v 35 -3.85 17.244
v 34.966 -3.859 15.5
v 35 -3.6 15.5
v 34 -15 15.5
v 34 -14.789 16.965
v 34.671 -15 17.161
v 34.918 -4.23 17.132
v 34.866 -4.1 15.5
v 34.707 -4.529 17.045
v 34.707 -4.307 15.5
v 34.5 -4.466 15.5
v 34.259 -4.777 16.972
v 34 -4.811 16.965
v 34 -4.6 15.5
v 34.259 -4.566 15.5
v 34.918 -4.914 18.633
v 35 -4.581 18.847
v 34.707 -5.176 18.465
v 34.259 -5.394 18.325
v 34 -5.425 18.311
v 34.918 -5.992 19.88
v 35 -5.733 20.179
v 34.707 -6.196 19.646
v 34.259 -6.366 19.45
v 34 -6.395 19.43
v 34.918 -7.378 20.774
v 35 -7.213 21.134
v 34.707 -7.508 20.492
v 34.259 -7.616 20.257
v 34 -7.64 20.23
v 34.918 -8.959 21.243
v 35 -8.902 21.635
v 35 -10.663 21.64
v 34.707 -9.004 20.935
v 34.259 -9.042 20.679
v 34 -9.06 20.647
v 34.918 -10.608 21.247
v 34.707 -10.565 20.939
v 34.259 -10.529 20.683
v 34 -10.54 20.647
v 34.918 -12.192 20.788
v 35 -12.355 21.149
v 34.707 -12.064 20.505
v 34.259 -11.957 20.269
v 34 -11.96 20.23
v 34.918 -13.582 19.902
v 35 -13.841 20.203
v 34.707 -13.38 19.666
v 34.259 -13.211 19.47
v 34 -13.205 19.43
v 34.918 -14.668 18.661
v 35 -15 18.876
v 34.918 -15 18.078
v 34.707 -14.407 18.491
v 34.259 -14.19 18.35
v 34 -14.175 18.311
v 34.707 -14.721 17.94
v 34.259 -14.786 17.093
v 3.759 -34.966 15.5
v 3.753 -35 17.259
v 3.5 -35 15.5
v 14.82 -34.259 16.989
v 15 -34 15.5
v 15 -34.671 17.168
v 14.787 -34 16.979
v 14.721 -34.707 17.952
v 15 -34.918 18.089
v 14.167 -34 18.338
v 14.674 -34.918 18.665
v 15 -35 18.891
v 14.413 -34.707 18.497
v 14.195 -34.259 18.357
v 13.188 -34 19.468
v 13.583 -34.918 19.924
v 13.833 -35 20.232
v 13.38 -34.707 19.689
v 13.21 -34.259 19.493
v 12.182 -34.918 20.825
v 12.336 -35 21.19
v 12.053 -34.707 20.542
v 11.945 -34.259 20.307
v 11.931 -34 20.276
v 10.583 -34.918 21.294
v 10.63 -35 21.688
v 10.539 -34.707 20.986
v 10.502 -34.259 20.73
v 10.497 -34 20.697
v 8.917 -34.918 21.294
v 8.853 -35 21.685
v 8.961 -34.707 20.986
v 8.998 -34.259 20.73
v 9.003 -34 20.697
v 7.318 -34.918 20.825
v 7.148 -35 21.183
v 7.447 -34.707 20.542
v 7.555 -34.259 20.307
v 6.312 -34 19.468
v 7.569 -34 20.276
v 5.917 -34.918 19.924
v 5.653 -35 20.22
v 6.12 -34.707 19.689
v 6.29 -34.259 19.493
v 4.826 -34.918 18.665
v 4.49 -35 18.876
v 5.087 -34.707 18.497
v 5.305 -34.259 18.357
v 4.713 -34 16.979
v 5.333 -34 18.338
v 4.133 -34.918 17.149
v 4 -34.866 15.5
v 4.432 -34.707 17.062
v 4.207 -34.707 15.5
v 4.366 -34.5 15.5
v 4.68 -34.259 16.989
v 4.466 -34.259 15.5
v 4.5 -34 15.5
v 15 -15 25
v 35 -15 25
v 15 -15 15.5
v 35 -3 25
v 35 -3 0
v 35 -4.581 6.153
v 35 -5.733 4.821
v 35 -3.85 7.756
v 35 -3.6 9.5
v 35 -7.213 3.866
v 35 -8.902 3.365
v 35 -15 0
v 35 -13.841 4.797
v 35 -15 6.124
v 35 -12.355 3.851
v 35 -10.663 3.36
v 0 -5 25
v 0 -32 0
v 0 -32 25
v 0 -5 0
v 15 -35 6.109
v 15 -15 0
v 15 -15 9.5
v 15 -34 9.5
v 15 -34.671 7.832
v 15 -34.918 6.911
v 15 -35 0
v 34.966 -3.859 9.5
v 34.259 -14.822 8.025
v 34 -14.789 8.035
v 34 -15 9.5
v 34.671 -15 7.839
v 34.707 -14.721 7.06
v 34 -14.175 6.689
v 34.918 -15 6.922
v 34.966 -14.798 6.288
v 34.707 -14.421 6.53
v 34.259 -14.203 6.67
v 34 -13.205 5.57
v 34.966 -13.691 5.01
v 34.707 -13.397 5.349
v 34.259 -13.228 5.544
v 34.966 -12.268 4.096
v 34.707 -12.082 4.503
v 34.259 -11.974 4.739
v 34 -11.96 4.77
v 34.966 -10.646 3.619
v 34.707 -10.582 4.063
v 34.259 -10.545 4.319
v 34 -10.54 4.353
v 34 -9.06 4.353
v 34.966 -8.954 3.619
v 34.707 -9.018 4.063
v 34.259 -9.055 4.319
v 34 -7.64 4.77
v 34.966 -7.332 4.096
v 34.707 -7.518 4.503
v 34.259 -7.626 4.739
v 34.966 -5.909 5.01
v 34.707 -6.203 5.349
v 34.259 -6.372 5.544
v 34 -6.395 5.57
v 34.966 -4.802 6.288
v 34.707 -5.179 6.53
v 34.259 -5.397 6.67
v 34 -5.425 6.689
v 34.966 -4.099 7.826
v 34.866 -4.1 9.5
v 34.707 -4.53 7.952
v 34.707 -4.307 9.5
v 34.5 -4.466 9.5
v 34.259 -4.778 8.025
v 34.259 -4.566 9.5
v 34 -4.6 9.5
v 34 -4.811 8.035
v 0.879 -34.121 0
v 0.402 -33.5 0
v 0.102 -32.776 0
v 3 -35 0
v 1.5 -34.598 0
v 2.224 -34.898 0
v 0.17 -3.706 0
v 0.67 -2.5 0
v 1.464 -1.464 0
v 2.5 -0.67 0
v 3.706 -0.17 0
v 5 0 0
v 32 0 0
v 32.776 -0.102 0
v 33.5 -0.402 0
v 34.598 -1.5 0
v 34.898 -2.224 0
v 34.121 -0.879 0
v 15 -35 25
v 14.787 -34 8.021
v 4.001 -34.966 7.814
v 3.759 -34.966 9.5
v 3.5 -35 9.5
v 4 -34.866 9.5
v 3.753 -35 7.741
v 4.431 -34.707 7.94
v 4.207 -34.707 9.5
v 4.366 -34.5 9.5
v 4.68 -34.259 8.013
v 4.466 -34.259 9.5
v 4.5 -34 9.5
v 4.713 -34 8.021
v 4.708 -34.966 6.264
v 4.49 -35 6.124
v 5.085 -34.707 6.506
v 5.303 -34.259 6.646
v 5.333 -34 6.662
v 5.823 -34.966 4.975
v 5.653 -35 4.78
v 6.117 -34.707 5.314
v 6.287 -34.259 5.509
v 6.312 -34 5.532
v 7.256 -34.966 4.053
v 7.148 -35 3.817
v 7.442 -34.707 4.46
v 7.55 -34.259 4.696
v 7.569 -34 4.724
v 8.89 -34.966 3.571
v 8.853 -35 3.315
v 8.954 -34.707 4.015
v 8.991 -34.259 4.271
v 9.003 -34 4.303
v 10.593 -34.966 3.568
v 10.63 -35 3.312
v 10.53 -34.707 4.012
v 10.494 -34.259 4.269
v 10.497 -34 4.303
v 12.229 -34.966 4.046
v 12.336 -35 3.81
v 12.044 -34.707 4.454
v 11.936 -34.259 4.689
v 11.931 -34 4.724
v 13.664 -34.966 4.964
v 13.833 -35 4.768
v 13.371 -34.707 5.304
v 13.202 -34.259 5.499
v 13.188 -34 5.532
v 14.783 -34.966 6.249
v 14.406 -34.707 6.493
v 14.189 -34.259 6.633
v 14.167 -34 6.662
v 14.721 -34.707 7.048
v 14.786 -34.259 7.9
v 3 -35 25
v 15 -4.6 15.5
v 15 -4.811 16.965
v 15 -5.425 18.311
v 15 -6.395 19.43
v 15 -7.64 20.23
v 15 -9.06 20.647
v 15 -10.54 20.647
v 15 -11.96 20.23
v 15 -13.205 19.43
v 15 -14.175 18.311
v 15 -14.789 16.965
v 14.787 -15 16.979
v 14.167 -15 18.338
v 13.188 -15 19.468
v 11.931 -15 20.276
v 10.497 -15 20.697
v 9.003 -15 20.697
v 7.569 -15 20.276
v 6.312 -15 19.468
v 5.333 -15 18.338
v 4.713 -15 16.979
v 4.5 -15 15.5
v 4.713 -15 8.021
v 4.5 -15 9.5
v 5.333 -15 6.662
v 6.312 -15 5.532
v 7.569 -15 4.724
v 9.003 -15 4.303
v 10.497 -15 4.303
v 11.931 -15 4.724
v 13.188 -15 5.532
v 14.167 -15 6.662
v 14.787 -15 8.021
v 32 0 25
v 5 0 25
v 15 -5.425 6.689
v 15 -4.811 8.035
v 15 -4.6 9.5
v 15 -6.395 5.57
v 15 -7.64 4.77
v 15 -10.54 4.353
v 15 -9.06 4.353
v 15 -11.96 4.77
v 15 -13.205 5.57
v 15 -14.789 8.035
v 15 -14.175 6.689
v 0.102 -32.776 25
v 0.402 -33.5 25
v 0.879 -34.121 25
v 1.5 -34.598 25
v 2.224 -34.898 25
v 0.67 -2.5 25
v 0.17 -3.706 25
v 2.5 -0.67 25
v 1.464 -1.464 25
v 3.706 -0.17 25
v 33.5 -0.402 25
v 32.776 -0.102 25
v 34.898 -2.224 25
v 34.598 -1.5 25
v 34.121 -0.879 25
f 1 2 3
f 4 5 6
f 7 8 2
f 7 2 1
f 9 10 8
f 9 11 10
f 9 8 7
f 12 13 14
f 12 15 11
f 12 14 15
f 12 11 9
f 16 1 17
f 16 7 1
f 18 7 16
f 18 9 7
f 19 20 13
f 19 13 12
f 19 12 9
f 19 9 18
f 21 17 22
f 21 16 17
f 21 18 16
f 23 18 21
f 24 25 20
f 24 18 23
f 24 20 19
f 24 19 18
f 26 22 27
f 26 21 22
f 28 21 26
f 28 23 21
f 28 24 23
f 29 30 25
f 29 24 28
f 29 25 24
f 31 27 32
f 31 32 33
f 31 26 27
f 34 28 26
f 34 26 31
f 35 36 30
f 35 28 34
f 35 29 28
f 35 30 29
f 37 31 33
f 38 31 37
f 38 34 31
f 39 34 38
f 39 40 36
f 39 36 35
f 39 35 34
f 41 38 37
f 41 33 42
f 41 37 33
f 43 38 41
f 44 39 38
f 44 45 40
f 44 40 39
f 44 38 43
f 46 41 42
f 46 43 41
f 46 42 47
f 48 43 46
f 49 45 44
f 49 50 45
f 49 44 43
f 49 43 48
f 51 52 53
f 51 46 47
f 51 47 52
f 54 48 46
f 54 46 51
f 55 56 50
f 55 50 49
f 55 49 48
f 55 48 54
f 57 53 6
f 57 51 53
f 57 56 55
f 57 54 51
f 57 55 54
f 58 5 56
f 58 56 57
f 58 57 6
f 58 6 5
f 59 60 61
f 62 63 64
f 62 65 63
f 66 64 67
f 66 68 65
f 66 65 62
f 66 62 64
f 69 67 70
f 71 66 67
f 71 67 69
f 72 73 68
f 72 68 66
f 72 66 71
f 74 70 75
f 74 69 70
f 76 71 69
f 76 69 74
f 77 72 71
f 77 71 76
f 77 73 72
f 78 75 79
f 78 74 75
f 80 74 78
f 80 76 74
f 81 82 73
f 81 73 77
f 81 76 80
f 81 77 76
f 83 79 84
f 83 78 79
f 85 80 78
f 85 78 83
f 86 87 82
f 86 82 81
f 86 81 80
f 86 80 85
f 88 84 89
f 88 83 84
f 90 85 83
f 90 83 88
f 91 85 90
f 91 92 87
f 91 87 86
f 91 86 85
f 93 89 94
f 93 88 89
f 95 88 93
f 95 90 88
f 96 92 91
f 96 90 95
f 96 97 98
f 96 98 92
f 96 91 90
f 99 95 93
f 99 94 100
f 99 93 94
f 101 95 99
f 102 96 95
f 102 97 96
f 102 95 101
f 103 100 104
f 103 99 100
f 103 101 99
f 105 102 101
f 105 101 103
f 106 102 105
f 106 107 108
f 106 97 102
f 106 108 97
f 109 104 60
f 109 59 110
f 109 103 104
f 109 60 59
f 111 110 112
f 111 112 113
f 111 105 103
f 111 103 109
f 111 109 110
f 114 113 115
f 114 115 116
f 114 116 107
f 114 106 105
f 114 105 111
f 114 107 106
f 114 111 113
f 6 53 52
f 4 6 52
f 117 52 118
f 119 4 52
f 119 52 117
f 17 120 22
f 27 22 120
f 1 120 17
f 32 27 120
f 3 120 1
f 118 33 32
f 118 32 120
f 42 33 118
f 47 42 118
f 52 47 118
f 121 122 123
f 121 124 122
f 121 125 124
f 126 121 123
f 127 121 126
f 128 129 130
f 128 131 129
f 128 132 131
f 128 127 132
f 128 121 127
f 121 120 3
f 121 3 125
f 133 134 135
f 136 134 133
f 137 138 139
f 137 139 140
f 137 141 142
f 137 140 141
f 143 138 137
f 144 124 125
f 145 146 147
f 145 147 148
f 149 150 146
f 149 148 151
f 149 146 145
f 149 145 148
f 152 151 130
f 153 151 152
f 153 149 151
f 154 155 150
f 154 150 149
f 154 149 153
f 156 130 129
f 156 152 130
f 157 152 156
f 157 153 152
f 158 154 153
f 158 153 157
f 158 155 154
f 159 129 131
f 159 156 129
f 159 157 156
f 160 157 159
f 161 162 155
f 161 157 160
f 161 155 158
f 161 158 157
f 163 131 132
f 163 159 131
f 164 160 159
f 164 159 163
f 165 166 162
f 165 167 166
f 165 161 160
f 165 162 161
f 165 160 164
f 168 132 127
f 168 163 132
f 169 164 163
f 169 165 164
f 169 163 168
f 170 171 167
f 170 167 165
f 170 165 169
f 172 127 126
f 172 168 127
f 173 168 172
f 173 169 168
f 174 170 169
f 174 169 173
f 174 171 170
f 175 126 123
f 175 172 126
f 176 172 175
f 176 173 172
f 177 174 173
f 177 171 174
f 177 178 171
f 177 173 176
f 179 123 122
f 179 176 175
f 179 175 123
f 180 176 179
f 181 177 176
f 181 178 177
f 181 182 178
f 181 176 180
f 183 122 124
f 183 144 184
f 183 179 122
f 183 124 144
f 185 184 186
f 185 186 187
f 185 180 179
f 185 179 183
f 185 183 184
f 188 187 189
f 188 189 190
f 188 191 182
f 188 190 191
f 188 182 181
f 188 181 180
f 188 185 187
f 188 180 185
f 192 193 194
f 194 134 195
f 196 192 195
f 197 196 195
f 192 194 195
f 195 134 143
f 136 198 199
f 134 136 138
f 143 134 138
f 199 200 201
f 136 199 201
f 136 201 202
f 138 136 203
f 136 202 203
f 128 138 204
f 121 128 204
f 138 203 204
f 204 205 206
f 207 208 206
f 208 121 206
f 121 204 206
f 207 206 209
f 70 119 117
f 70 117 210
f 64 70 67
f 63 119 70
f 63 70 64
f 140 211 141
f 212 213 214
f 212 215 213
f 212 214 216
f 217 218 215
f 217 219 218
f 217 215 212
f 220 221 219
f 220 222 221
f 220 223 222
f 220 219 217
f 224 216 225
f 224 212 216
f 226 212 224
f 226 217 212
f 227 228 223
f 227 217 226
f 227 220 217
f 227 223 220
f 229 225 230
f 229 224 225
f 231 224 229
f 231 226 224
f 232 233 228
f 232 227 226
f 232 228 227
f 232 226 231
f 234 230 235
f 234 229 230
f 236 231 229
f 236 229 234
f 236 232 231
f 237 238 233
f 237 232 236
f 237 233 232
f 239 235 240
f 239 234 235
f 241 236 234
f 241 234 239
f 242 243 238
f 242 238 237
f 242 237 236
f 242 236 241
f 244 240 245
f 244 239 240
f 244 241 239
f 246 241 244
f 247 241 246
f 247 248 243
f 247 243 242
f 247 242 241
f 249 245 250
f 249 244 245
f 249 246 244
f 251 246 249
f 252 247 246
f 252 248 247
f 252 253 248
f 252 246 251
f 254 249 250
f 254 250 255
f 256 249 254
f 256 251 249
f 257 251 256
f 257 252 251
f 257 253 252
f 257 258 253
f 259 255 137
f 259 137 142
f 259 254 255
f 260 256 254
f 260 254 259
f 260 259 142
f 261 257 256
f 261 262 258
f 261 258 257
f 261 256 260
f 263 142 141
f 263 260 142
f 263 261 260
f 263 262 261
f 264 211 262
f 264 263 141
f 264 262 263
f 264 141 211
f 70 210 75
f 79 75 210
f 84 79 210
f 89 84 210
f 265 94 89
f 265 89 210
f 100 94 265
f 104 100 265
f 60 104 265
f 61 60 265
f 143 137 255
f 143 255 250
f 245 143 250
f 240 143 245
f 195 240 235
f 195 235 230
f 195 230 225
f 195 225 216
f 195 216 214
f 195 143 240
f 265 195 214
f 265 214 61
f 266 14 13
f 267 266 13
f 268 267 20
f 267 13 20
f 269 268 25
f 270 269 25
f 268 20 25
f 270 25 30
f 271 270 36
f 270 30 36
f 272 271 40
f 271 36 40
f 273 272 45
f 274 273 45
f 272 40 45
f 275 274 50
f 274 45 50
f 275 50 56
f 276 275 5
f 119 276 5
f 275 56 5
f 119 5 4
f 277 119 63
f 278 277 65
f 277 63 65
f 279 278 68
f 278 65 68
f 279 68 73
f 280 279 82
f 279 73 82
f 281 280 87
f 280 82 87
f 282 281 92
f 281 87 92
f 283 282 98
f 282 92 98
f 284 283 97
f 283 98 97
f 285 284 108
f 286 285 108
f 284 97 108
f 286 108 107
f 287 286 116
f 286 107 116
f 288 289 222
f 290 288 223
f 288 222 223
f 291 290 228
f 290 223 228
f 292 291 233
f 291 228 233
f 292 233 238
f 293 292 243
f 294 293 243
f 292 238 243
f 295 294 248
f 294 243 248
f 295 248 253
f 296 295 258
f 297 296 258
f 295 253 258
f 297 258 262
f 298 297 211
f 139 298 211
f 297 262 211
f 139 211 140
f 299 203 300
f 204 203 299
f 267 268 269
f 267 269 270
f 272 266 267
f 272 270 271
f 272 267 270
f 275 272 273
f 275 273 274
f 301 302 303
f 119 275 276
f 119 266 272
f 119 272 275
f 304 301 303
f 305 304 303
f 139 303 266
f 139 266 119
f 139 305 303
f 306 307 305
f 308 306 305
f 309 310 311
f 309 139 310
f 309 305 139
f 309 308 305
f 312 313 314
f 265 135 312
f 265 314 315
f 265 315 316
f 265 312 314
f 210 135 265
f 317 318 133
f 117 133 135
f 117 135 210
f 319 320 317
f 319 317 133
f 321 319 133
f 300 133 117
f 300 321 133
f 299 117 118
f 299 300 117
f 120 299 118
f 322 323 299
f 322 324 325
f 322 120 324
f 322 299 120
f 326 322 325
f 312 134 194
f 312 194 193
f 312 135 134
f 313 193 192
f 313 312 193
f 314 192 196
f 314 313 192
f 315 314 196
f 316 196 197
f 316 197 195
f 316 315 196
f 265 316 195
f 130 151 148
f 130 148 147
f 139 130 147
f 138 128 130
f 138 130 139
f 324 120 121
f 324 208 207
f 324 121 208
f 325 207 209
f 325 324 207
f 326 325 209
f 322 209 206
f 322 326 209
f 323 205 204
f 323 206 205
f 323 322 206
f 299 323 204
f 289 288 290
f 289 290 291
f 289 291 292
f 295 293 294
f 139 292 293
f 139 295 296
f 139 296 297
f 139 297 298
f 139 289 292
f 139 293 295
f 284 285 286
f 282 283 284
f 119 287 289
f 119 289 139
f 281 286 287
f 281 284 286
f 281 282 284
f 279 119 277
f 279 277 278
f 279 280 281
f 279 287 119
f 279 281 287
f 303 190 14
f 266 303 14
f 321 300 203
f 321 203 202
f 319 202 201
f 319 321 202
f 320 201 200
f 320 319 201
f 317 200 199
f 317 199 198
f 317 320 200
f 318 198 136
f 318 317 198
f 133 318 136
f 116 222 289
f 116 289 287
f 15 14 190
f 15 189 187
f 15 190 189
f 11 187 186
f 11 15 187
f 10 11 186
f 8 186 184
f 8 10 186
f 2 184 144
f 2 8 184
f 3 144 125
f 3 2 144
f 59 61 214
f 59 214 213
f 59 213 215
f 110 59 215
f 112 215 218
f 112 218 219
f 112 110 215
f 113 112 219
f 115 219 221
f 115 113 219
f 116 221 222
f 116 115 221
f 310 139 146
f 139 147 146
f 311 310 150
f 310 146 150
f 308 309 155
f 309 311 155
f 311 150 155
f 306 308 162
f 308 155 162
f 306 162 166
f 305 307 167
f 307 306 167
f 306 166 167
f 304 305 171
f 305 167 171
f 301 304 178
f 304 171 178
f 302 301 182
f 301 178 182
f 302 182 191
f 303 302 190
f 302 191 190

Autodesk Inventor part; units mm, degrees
ref_plane "YZ Plane" through (0, 0, 0) normal (1, 0, 0) x (0, 1, 0)
ref_plane "XZ Plane" through (0, 0, 0) normal (0, 1, 0) x (-1, 0, 0)
ref_plane "XY Plane" through (0, 0, 0) normal (0, 0, 1) x (1, 0, 0)
sketch "Sketch1" plane through (0, 0, 0) normal (0, 0, 1) x (1, 0, 0)
  line L0 (0, 0) -> (15, 0)
  line L1 (15, 0) -> (15, -35)
  line L2 (15, -35) -> (0, -35)
  line L3 (0, -35) -> (0, 0)
  line L4 (0, 0) -> (35, 0)
  line L5 (35, 0) -> (35, -15)
  line L6 (35, -15) -> (0, -15)
  line L7 (0, -15) -> (0, 0)
  dimension "d0" = 15
  dimension "d1" = 35
  dimension "d2" = 35
  dimension "d3" = 15
extrude "Extrusion1" add sketch "Sketch1" along normal blind 25
sketch "Sketch15" plane through (35, -15, 0) normal (1, 0, 0) x (0, 0, -1)
  line L0 (0, 0) -> (-25, 0) construction
  line L1 (0, 0) -> (0, 15) construction
  line L2 (-25, 0) -> (0, 0) construction
  line L3 (0, 0) -> (0, 10.4) construction
  line L4 (0, 10.4) -> (-25, 10.4) construction
  line L5 (-25, 10.4) -> (-25, 0) construction
  line L6 (-20.7, 0) -> (-4.3, 0) construction
  line L7 (-4.3, 0) -> (-4.3, 10.4) construction
  line L8 (-4.3, 10.4) -> (-20.7, 10.4) construction
  line L9 (-20.7, 10.4) -> (-20.7, 0) construction
  line L10 (-20.7, 0) -> (-4.3, 10.4) construction
  line L11 (-4.3, 0) -> (-20.7, 10.4) construction
  circle A0 centre (-15.5, 5.2) radius 5.2
  circle A1 centre (-9.5, 5.2) radius 5.2
  line L12 (-15.5, 0) -> (-9.5, 0)
  line L13 (-9.5, 0) -> (-9.5, 10.4)
  line L14 (-9.5, 10.4) -> (-15.5, 10.4)
  line L15 (-15.5, 10.4) -> (-15.5, 0)
  line L16 (-15.5, 0) -> (-9.5, 10.4) construction
  line L17 (-9.5, 0) -> (-15.5, 10.4) construction
  point P0 (-12.5, 5.2)
  dimension "d58" = 10.4
  dimension "d59" = 16.4
  dimension "d60" = 10.4
extrude "Extrusion9" cut sketch "Sketch15" against normal blind 20
sketch "Sketch16" plane through (0, -35, 0) normal (0, -1, 0) x (1, 0, 0)
  line L0 (15, 25) -> (15, 15.5) construction
  line L1 (35, 0) -> (0, 0) construction
  line L2 (15, 25) -> (4.5, 25) construction
  line L3 (4.5, 25) -> (4.5, 0) construction
  line L4 (4.5, 0) -> (15, 0) construction
  line L5 (15, 0) -> (15, 25) construction
  line L6 (4.5, 20.75) -> (15, 20.75) construction
  line L7 (15, 20.75) -> (15, 4.25) construction
  line L8 (15, 4.25) -> (4.5, 4.25) construction
  line L9 (4.5, 4.25) -> (4.5, 20.75) construction
  line L10 (4.5, 20.75) -> (15, 4.25) construction
  line L11 (15, 20.75) -> (4.5, 4.25) construction
  circle A0 centre (9.75, 15.5) radius 5.25
  circle A1 centre (9.75, 9.5) radius 5.25
  line L12 (15, 15.5) -> (15, 9.5) projected
  line L13 (4.5, 15.5) -> (15, 15.5)
  line L14 (15, 15.5) -> (15, 9.5)
  line L15 (15, 9.5) -> (4.5, 9.5)
  line L16 (4.5, 9.5) -> (4.5, 15.5)
  line L17 (4.5, 15.5) -> (15, 9.5) construction
  line L18 (15, 15.5) -> (4.5, 9.5) construction
  point P0 (9.75, 12.5)
  dimension "d63" = 10.5
  dimension "d64" = 10.5
  dimension "d65" = 16.5
extrude "Extrusion10" cut sketch "Sketch16" against normal blind 20
fillet "Fillet10" radius 1 6 edges at (4.5, -35, 12.5) (9.75, -35, 4.25) (9.75, -35, 20.75) (35, -4.6, 12.5) (35, -9.8, 4.3) (35, -9.8, 20.7)
fillet "Fillet11" radius 5 1 edges at (0, 0, 12.5)
fillet "Fillet12" radius 3 2 edges at (0, -35, 12.5) (35, 0, 12.5)
properties part number "Gate Corner V5"
